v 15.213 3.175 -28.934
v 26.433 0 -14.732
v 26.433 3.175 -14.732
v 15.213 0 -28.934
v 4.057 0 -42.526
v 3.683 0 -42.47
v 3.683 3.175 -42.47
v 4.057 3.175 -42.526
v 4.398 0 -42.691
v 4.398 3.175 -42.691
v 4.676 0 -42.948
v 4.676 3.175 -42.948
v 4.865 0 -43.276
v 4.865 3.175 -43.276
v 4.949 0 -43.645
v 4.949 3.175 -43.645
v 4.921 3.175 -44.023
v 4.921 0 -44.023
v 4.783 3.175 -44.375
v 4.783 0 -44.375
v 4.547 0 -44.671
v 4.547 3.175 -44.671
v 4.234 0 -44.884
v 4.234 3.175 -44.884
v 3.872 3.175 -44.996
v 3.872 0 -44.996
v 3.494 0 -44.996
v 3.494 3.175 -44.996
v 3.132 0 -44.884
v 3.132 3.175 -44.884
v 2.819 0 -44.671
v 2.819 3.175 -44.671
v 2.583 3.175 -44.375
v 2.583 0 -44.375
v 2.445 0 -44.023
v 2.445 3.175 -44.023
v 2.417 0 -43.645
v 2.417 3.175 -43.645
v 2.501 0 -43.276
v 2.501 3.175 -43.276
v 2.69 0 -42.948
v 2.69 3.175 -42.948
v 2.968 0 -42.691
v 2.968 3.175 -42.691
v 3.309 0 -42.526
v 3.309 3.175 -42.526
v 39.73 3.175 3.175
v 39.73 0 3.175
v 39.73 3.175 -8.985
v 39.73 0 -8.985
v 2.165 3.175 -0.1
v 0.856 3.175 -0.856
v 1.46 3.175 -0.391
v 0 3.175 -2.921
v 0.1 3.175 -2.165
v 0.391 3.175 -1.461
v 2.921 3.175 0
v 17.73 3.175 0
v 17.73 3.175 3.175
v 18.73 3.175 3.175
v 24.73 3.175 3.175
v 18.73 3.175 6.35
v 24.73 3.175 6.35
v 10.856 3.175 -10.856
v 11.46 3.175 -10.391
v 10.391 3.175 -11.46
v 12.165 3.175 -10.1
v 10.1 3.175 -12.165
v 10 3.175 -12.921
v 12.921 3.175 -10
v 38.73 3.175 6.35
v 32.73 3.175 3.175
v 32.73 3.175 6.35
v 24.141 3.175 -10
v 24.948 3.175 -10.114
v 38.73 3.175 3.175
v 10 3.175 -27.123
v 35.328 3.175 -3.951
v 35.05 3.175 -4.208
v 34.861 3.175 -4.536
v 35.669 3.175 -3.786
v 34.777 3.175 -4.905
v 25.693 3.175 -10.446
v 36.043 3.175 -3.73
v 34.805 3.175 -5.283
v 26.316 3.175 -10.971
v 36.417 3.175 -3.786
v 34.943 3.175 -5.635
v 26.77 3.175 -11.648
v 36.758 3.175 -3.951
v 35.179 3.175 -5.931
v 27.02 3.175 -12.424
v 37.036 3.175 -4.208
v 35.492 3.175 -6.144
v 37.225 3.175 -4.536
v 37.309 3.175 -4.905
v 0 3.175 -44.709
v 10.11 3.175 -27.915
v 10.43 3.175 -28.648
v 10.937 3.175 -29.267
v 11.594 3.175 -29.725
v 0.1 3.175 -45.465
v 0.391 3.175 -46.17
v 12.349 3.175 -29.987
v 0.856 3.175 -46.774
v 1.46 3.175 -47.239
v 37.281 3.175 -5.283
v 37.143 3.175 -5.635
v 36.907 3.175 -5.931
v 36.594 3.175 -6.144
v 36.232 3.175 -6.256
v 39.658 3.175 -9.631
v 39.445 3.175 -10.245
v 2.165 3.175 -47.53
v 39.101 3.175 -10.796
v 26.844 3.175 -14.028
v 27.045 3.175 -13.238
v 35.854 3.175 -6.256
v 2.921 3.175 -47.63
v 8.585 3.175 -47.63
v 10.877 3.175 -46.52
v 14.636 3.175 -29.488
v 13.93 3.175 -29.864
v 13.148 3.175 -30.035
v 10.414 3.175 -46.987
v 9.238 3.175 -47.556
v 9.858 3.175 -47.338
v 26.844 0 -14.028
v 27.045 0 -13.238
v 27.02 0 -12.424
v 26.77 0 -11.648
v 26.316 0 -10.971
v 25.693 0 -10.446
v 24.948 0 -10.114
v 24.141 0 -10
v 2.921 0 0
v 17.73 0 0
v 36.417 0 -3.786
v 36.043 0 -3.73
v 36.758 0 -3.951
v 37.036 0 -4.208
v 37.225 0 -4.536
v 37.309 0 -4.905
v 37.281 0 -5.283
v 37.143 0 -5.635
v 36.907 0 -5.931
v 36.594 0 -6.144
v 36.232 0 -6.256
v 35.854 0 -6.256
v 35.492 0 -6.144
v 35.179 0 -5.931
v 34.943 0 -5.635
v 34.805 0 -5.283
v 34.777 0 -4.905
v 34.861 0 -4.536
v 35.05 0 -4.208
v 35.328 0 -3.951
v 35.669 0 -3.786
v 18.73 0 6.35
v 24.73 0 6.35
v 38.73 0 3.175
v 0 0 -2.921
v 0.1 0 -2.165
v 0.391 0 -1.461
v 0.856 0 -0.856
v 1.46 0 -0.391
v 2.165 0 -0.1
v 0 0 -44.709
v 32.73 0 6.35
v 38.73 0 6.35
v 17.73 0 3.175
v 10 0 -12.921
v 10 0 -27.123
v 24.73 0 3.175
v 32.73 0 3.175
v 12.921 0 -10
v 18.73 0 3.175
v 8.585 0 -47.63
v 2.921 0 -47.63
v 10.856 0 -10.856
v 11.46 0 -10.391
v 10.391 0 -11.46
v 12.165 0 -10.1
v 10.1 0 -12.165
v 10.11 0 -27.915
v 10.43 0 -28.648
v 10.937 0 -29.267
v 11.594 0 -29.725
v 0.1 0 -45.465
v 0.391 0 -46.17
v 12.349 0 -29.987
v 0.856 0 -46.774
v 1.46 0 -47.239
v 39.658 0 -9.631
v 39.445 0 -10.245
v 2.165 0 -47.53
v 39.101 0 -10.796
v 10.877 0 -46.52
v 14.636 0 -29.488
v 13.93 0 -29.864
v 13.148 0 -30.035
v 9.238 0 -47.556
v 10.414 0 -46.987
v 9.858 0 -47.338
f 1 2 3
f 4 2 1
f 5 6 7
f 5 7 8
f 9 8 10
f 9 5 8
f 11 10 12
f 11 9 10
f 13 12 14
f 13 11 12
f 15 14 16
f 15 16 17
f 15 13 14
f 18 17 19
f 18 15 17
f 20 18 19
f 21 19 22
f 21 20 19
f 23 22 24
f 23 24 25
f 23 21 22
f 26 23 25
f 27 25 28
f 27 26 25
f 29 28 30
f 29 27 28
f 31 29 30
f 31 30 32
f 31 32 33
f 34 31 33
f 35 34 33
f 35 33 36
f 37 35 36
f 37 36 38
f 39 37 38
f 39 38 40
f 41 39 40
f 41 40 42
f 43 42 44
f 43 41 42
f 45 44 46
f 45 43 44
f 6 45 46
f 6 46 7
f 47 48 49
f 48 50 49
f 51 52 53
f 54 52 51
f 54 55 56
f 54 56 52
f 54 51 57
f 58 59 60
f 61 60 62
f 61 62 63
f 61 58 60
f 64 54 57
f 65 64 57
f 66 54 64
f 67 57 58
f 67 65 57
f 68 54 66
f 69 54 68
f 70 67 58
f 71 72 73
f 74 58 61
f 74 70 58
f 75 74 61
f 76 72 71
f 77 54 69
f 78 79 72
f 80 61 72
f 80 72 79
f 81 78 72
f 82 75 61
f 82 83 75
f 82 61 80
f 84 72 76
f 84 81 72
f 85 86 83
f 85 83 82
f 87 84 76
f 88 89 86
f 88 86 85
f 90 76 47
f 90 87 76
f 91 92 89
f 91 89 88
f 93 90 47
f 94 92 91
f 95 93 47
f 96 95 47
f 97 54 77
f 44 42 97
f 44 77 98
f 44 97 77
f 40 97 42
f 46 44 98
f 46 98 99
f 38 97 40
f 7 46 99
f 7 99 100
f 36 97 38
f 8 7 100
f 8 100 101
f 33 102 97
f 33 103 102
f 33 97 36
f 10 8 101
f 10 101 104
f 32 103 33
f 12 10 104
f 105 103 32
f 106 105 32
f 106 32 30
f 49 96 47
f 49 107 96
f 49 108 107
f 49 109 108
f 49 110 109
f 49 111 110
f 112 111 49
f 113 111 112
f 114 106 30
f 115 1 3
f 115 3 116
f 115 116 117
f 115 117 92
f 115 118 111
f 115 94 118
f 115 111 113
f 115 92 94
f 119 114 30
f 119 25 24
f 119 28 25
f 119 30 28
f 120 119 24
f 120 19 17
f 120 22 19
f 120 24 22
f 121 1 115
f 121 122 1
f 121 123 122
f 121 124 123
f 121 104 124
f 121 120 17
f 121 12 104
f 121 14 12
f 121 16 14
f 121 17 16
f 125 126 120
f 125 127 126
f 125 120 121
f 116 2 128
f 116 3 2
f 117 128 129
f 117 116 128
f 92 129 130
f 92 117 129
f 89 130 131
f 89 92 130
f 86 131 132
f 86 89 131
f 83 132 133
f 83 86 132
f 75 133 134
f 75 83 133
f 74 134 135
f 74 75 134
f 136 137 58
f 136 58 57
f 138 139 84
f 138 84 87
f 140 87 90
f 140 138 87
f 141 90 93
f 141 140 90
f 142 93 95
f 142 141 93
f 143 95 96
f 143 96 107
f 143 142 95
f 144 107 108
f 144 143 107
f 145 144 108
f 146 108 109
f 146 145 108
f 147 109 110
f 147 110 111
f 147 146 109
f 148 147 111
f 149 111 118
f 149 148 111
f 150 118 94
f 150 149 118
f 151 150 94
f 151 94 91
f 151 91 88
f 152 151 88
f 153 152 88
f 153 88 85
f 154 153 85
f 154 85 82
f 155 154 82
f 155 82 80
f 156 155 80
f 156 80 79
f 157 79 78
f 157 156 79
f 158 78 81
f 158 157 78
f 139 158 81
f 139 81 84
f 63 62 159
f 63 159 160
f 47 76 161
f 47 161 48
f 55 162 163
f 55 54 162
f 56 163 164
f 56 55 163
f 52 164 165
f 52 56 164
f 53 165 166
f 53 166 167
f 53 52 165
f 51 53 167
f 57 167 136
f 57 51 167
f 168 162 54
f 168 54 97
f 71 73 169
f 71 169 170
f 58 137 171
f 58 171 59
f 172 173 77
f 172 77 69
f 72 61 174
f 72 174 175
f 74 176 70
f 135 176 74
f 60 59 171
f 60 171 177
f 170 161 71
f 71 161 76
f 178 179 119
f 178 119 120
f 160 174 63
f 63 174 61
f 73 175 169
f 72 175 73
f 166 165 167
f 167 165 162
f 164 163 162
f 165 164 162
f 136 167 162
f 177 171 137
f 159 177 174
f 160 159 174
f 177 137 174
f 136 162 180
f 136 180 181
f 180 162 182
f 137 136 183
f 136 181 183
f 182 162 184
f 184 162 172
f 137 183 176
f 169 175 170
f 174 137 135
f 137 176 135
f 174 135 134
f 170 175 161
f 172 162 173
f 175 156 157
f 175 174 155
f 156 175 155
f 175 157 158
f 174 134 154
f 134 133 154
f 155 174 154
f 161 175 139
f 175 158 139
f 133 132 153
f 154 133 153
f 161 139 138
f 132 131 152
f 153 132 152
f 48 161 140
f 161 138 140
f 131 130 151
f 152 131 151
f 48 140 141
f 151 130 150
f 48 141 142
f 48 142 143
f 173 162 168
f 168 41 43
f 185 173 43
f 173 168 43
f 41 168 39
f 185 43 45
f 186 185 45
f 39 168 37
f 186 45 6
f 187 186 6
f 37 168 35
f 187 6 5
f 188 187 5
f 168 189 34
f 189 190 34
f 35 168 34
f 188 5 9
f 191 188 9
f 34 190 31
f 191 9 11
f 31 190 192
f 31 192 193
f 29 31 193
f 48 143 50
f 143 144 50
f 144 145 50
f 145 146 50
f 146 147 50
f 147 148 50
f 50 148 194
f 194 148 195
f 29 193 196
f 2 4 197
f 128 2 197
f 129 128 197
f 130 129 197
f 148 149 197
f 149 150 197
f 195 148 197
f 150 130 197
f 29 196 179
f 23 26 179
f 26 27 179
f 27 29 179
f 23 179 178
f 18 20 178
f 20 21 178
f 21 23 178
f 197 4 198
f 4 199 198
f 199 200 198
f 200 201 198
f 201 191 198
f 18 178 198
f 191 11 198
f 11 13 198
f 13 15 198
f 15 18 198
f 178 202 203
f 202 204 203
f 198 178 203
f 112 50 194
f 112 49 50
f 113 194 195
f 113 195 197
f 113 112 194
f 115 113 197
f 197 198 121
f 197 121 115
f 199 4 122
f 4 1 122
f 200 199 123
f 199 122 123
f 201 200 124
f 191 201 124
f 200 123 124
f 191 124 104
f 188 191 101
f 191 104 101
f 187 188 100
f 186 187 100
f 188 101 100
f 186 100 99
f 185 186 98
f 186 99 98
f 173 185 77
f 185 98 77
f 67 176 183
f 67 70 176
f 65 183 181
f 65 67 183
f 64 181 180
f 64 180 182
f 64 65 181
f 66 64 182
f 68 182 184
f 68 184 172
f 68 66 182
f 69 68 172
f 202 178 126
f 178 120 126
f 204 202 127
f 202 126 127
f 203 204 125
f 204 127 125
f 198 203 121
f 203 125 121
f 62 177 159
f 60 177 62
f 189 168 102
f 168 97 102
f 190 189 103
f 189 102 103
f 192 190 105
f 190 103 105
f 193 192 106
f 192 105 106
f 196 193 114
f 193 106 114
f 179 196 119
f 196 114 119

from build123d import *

# Parameters (mm, degrees)
SKETCH1_R           = 1.27
BOSS_EXTRUDE1_DEPTH = 3.175
FILLET1_R           = 2.921
SKETCH5_W           = 22
SKETCH5_H           = 3.175
BOSS_EXTRUDE3_DEPTH = 3.175
SKETCH2_W           = 6
SKETCH2_H           = 3.175
BOSS_EXTRUDE2_DEPTH = 3.175


with BuildPart() as part:
    # Sketch1 → Boss-Extrude1 (new body)
    with BuildSketch(Plane(origin=(0, 0, 0), x_dir=(1, 0, 0), z_dir=(0, 1, 0))):
        Polygon((0, 0), (0, 47.63), (10, 47.63), (39.73, 10), (39.73, 0), align=None)
        with Locations(Location((3.683, 43.74, 0), (0, 0, 270))):
            Circle(SKETCH1_R, mode=Mode.SUBTRACT)
        with Locations(Location((36.043, 5, 0), (0, 0, 270))):
            Circle(SKETCH1_R, mode=Mode.SUBTRACT)
        Polygon((10, 35.531824847), (10, 10), (30.171702171, 10), align=None, mode=Mode.SUBTRACT)
    extrude(amount=BOSS_EXTRUDE1_DEPTH)

    # Fillet1
    fillet1_edges = [part.edges().sort_by_distance(p)[0] for p in [
        (10, 1.5875, -10),
        (30.171702171, 1.5875, -10),
        (10, 1.5875, -35.531824847),
        (0, 1.5875, 0),
        (0, 1.5875, -47.63),
        (10, 1.5875, -47.63),
        (39.73, 1.5875, -10),
    ]]
    fillet(fillet1_edges, radius=FILLET1_R)

    # Sketch5 → Boss-Extrude3 (add)
    with BuildSketch(Plane.XY):
        with Locations((28.73, 1.5875)):
            Rectangle(SKETCH5_W, SKETCH5_H)
    extrude(amount=BOSS_EXTRUDE3_DEPTH)

    # Sketch2 → Boss-Extrude2 (add)
    with BuildSketch(Plane.XY.offset(3.175)):
        with Locations((21.73, 1.5875)):
            Rectangle(SKETCH2_W, SKETCH2_H)
        with Locations((35.73, 1.5875)):
            Rectangle(SKETCH2_W, SKETCH2_H)
    extrude(amount=BOSS_EXTRUDE2_DEPTH)


solid = part.part
